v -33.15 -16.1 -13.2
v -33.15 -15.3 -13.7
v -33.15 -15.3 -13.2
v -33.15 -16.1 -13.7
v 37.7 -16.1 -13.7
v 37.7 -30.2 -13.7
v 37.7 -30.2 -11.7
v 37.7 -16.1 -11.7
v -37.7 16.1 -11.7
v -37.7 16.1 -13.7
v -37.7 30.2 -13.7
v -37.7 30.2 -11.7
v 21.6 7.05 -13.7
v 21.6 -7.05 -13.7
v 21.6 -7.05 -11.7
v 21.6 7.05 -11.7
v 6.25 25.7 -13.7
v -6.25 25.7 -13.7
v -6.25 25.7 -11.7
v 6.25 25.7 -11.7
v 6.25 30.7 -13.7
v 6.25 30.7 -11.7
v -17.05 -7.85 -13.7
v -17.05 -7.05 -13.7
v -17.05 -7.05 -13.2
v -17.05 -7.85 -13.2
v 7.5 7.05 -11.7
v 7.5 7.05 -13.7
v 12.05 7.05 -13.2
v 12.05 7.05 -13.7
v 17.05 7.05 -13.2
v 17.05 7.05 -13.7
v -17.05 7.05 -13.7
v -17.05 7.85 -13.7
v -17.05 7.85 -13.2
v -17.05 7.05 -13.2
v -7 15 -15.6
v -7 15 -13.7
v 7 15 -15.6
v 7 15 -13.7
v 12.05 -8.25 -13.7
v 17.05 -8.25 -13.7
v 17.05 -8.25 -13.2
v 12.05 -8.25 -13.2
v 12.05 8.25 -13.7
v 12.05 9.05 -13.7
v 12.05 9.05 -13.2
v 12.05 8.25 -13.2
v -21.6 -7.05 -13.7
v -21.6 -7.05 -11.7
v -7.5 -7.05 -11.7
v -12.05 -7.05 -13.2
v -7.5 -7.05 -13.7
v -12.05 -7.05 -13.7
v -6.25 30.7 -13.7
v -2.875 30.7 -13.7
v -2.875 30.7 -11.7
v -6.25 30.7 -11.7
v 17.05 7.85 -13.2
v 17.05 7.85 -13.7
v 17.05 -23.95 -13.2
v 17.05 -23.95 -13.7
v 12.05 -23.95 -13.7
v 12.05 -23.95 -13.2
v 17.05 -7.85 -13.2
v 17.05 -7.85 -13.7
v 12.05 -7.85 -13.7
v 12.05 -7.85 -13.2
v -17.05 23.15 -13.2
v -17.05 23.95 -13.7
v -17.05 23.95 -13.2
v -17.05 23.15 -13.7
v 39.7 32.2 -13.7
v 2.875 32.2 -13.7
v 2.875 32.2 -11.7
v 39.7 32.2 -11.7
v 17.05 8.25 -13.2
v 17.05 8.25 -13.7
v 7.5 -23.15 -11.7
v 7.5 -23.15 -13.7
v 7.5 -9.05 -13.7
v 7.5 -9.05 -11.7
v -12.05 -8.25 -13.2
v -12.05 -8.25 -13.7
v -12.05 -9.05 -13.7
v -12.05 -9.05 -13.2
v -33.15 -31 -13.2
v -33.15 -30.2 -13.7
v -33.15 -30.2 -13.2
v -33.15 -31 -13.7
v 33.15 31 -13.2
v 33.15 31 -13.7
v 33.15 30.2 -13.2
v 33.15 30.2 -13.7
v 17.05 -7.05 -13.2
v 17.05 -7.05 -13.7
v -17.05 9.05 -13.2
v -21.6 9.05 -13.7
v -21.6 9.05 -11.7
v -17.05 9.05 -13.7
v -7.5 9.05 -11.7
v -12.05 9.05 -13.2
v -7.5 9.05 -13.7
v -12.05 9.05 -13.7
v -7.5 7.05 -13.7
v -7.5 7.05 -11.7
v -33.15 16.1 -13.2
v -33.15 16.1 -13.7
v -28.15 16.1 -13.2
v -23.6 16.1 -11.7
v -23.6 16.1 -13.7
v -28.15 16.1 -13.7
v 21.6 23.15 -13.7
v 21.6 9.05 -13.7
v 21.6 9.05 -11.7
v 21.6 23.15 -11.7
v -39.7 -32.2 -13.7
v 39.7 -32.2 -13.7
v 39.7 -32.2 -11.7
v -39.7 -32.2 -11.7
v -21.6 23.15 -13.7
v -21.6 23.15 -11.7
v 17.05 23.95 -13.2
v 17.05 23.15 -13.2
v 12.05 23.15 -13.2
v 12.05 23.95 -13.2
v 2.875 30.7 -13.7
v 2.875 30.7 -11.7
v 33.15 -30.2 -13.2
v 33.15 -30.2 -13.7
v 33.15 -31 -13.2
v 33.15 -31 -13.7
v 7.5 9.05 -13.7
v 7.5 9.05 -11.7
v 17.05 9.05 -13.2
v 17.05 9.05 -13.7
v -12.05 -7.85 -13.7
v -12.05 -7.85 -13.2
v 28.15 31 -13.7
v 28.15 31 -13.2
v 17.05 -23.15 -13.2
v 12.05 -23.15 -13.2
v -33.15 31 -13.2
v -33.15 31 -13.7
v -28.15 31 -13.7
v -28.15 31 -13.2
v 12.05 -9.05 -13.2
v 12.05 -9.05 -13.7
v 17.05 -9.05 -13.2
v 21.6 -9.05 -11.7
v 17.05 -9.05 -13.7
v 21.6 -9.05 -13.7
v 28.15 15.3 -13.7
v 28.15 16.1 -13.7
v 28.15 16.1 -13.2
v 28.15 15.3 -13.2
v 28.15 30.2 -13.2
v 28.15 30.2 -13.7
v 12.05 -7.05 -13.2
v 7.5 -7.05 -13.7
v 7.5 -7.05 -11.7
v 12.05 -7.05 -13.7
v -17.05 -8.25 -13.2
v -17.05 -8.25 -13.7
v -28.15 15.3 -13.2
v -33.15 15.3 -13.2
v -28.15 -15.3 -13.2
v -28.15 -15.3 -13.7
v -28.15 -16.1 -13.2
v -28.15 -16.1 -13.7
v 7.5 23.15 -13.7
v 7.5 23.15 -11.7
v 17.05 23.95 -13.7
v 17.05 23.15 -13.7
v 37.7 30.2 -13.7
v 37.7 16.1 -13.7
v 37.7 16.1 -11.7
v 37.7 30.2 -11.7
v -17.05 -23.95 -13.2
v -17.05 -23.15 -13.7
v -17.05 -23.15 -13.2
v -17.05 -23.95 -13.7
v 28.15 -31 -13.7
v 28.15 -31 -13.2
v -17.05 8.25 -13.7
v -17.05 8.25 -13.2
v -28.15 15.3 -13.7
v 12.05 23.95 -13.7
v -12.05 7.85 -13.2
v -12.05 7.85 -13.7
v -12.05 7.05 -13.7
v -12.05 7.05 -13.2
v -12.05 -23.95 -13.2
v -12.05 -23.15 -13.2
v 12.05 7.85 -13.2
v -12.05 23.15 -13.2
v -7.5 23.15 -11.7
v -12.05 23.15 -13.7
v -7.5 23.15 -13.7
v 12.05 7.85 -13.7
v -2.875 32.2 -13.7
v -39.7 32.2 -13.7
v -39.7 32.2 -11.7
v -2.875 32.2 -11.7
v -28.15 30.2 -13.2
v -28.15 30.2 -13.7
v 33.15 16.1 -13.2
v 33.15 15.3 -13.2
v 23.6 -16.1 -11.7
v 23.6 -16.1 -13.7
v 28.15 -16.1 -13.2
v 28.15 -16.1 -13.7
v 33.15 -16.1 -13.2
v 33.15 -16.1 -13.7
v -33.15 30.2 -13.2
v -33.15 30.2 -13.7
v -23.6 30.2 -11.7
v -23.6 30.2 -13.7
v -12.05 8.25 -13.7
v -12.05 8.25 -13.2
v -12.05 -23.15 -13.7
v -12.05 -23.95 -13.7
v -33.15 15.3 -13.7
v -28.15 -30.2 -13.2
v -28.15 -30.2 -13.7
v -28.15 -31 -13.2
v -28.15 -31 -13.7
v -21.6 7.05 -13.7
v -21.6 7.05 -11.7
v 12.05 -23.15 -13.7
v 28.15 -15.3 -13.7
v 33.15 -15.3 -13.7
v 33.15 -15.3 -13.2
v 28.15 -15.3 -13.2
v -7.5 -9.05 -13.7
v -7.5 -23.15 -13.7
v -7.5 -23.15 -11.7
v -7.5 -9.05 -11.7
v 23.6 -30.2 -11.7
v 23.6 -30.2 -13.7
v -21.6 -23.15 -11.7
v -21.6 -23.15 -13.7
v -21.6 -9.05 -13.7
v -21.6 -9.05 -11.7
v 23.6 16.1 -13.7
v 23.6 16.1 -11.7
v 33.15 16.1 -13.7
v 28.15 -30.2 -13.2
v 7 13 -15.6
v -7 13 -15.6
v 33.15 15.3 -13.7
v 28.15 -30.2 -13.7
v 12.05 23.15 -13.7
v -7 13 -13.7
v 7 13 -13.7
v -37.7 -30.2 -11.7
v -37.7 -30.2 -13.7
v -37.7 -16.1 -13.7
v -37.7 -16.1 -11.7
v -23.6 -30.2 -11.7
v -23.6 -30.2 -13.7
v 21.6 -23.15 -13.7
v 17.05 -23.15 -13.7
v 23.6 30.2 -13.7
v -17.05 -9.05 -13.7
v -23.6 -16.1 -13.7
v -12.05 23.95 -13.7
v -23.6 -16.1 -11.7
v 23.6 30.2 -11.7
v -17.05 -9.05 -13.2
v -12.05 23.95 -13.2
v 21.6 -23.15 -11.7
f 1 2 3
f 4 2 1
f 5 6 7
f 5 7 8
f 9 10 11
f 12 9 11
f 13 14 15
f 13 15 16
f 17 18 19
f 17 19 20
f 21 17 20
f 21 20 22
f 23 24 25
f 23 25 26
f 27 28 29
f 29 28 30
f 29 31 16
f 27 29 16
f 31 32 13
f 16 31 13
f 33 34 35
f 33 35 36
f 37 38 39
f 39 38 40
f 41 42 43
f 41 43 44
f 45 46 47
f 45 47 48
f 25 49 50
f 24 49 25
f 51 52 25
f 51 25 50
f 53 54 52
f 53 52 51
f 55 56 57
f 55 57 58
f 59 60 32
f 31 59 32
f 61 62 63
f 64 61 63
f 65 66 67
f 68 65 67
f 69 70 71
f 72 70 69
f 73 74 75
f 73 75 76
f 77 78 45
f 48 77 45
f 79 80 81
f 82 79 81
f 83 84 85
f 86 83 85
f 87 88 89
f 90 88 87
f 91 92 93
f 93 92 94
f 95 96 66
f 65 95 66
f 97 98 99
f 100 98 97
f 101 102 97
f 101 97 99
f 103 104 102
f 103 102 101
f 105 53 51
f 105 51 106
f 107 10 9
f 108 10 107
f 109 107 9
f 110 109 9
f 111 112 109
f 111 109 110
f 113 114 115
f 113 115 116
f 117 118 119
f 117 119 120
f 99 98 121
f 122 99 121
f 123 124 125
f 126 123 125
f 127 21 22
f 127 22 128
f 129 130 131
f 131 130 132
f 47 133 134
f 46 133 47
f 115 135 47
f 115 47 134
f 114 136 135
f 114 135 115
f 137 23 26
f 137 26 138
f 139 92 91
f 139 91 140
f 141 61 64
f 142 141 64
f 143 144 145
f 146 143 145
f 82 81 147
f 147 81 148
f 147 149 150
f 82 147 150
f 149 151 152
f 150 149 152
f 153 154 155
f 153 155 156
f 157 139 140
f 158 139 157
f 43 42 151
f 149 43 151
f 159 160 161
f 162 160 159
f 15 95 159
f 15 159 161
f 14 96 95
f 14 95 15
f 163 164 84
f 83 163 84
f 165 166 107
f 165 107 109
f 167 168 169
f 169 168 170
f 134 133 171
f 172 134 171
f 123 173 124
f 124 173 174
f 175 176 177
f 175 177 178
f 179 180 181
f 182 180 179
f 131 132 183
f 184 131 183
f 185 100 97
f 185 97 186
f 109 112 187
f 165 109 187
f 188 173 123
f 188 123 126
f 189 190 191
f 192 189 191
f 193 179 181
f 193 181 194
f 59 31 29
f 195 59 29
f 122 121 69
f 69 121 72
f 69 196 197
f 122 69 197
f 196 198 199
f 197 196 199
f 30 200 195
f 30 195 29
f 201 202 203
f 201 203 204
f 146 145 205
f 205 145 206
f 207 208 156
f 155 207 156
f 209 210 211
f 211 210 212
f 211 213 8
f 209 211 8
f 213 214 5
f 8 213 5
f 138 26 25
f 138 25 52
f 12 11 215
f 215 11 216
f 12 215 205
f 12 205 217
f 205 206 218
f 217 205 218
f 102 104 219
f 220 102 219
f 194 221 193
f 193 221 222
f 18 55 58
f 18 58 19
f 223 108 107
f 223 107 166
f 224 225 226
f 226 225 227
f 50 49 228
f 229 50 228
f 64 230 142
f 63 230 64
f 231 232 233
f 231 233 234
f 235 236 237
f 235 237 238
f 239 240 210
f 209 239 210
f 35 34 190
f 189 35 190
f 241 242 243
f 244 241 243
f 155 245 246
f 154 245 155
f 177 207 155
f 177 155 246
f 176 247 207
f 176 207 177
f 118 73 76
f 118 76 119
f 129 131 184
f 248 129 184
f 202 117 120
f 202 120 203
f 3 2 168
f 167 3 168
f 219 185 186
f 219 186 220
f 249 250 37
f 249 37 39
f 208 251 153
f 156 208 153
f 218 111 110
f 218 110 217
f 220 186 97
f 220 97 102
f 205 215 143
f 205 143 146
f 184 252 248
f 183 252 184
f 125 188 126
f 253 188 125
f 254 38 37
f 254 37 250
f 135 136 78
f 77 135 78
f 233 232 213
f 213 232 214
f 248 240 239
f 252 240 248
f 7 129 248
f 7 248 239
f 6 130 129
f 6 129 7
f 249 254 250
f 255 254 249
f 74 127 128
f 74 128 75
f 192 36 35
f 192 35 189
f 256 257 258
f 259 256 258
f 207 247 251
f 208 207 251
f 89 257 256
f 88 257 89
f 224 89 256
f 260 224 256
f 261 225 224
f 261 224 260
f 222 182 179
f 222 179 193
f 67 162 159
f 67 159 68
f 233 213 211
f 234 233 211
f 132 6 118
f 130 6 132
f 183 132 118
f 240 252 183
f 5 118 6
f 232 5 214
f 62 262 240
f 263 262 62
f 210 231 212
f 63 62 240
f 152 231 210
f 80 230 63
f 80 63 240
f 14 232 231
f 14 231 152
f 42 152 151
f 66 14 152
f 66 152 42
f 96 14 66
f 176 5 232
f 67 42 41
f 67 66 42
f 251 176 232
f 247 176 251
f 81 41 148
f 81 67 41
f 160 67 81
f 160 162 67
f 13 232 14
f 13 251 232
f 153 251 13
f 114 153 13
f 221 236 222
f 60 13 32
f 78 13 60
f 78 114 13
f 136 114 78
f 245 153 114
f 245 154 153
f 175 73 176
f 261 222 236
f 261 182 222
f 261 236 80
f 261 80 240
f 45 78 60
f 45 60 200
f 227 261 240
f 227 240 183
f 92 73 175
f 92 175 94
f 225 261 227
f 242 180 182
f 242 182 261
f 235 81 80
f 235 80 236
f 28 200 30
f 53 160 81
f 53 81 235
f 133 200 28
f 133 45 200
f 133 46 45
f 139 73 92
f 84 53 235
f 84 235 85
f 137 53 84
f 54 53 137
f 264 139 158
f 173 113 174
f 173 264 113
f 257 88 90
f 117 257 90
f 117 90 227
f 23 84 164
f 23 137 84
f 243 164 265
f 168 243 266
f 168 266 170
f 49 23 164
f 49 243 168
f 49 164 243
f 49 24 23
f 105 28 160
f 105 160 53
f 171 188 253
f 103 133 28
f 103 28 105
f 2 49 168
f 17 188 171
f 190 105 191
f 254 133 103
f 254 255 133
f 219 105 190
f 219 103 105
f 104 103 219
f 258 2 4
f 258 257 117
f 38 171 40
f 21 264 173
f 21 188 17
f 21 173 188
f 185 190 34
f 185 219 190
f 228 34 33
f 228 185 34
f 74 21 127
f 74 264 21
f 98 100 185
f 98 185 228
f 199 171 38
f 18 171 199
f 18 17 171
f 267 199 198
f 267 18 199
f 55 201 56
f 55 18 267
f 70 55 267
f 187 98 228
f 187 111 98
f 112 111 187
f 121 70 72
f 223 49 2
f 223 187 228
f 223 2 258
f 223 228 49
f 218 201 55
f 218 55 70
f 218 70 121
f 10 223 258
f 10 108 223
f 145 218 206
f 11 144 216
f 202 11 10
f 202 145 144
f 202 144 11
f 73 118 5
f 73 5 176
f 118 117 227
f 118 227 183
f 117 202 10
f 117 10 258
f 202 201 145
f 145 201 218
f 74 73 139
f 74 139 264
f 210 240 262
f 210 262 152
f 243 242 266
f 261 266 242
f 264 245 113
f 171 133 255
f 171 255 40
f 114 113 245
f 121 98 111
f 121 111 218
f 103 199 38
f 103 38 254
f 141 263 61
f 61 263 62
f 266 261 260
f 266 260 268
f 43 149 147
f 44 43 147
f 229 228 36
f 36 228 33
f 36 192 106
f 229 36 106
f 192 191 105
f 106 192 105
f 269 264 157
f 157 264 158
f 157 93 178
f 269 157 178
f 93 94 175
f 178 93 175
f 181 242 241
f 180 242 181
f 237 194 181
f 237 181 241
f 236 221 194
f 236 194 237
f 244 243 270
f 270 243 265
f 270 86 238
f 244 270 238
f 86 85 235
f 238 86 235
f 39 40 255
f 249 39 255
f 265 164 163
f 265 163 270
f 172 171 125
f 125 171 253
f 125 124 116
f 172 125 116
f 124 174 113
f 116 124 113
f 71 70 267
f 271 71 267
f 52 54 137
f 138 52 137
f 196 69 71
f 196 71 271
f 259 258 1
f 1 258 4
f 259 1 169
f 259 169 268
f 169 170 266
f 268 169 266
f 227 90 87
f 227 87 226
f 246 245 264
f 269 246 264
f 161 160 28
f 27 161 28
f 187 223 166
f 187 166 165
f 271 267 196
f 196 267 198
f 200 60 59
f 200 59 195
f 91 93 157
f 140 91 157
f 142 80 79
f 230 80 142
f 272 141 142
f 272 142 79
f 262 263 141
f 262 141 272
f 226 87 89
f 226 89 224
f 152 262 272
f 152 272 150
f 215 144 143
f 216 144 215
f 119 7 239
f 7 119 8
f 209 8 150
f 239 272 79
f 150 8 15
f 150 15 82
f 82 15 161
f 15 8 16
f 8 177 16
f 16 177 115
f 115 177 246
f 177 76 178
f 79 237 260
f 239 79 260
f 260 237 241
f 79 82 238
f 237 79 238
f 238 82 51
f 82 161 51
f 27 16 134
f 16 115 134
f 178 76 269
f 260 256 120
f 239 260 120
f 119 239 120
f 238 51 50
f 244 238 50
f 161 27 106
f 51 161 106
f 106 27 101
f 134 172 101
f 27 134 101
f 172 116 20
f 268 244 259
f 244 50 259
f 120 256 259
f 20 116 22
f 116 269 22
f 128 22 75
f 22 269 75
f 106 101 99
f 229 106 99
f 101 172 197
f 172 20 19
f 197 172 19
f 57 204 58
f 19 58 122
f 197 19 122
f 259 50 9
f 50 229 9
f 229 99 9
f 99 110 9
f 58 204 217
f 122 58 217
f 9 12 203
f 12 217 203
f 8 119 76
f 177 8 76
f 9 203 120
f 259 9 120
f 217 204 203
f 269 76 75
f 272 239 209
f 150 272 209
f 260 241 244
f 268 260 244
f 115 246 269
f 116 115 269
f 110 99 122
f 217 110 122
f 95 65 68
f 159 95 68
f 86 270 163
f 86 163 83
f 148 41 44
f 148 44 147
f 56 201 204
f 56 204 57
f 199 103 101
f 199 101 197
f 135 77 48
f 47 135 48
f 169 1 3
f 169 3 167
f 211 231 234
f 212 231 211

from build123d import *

# Parameters (mm, degrees)
SKETCH020_W     = 14.1
SKETCH020_H     = 14.1
PAD014_DEPTH    = 2
SKETCH_W        = 14
SKETCH_H        = 2
PAD_DEPTH       = 1.9
SKETCH028_W     = 5
SKETCH028_H     = 0.8
POCKET004_DEPTH = 0.5


with BuildPart() as part:
    # Sketch020 → Pad014 (new body)
    with BuildSketch(Plane.XY):
        Polygon((39.7, 32.2), (39.7, -32.2), (-39.7, -32.2), (-39.7, 32.2), (-2.875, 32.2), (-2.875, 30.7), (-6.25, 30.7), (-6.25, 25.7), (6.25, 25.7), (6.25, 30.7), (2.875, 30.7), (2.875, 32.2), align=None)
        with Locations((-14.55, 16.1)):
            Rectangle(SKETCH020_W, SKETCH020_H, mode=Mode.SUBTRACT)
        with Locations((-14.55, 0)):
            Rectangle(SKETCH020_W, SKETCH020_H, mode=Mode.SUBTRACT)
        with Locations((-14.55, -16.1)):
            Rectangle(SKETCH020_W, SKETCH020_H, mode=Mode.SUBTRACT)
        with Locations((-30.65, -23.15)):
            Rectangle(SKETCH020_W, SKETCH020_H, mode=Mode.SUBTRACT)
        with Locations((-30.65, 23.15)):
            Rectangle(SKETCH020_W, SKETCH020_H, mode=Mode.SUBTRACT)
        with Locations((14.55, 16.1)):
            Rectangle(SKETCH020_W, SKETCH020_H, mode=Mode.SUBTRACT)
        with Locations((14.55, 0)):
            Rectangle(SKETCH020_W, SKETCH020_H, mode=Mode.SUBTRACT)
        with Locations((14.55, -16.1)):
            Rectangle(SKETCH020_W, SKETCH020_H, mode=Mode.SUBTRACT)
        with Locations((30.65, -23.15)):
            Rectangle(SKETCH020_W, SKETCH020_H, mode=Mode.SUBTRACT)
        with Locations((30.65, 23.15)):
            Rectangle(SKETCH020_W, SKETCH020_H, mode=Mode.SUBTRACT)
    extrude(amount=PAD014_DEPTH)

    # Sketch (on Face53 of Pad014) → Pad (join)
    with BuildSketch(Plane(origin=(0, 0, 0), x_dir=(1, 0, 0), z_dir=(0, 0, -1))):
        with Locations((0, -14)):
            Rectangle(SKETCH_W, SKETCH_H)
    extrude(amount=PAD_DEPTH)

    # Sketch028 (on Face4 of Pad) → Pocket004 (cut)
    with BuildSketch(Plane(origin=(0, 0, 0), x_dir=(1, 0, 0), z_dir=(0, 0, -1))):
        with Locations((-14.55, 7.45)):
            Rectangle(SKETCH028_W, SKETCH028_H)
        with Locations((-14.55, 8.65)):
            Rectangle(SKETCH028_W, SKETCH028_H)
        with Locations((-14.55, 23.55)):
            Rectangle(SKETCH028_W, SKETCH028_H)
        with Locations((-30.65, 30.6)):
            Rectangle(SKETCH028_W, SKETCH028_H)
        with Locations((-30.65, 15.7)):
            Rectangle(SKETCH028_W, SKETCH028_H)
        with Locations((-14.55, -7.45)):
            Rectangle(SKETCH028_W, SKETCH028_H)
        with Locations((-14.55, -8.65)):
            Rectangle(SKETCH028_W, SKETCH028_H)
        with Locations((-14.55, -23.55)):
            Rectangle(SKETCH028_W, SKETCH028_H)
        with Locations((-30.65, -30.6)):
            Rectangle(SKETCH028_W, SKETCH028_H)
        with Locations((-30.65, -15.7)):
            Rectangle(SKETCH028_W, SKETCH028_H)
    pocket004 = extrude(amount=-POCKET004_DEPTH, mode=Mode.SUBTRACT)

    # Mirrored: Pocket004 across Sketch028 V_Axis
    add(pocket004.mirror(Plane(origin=(0, 0, 0), x_dir=(0, 0, -1), z_dir=(1, 0, 0))), mode=Mode.SUBTRACT)


with BuildPart() as part_1:
    # Body005 placement: moved
    add(part.part.moved(Location((0, 0, -13.7))))


solid = part_1.part
